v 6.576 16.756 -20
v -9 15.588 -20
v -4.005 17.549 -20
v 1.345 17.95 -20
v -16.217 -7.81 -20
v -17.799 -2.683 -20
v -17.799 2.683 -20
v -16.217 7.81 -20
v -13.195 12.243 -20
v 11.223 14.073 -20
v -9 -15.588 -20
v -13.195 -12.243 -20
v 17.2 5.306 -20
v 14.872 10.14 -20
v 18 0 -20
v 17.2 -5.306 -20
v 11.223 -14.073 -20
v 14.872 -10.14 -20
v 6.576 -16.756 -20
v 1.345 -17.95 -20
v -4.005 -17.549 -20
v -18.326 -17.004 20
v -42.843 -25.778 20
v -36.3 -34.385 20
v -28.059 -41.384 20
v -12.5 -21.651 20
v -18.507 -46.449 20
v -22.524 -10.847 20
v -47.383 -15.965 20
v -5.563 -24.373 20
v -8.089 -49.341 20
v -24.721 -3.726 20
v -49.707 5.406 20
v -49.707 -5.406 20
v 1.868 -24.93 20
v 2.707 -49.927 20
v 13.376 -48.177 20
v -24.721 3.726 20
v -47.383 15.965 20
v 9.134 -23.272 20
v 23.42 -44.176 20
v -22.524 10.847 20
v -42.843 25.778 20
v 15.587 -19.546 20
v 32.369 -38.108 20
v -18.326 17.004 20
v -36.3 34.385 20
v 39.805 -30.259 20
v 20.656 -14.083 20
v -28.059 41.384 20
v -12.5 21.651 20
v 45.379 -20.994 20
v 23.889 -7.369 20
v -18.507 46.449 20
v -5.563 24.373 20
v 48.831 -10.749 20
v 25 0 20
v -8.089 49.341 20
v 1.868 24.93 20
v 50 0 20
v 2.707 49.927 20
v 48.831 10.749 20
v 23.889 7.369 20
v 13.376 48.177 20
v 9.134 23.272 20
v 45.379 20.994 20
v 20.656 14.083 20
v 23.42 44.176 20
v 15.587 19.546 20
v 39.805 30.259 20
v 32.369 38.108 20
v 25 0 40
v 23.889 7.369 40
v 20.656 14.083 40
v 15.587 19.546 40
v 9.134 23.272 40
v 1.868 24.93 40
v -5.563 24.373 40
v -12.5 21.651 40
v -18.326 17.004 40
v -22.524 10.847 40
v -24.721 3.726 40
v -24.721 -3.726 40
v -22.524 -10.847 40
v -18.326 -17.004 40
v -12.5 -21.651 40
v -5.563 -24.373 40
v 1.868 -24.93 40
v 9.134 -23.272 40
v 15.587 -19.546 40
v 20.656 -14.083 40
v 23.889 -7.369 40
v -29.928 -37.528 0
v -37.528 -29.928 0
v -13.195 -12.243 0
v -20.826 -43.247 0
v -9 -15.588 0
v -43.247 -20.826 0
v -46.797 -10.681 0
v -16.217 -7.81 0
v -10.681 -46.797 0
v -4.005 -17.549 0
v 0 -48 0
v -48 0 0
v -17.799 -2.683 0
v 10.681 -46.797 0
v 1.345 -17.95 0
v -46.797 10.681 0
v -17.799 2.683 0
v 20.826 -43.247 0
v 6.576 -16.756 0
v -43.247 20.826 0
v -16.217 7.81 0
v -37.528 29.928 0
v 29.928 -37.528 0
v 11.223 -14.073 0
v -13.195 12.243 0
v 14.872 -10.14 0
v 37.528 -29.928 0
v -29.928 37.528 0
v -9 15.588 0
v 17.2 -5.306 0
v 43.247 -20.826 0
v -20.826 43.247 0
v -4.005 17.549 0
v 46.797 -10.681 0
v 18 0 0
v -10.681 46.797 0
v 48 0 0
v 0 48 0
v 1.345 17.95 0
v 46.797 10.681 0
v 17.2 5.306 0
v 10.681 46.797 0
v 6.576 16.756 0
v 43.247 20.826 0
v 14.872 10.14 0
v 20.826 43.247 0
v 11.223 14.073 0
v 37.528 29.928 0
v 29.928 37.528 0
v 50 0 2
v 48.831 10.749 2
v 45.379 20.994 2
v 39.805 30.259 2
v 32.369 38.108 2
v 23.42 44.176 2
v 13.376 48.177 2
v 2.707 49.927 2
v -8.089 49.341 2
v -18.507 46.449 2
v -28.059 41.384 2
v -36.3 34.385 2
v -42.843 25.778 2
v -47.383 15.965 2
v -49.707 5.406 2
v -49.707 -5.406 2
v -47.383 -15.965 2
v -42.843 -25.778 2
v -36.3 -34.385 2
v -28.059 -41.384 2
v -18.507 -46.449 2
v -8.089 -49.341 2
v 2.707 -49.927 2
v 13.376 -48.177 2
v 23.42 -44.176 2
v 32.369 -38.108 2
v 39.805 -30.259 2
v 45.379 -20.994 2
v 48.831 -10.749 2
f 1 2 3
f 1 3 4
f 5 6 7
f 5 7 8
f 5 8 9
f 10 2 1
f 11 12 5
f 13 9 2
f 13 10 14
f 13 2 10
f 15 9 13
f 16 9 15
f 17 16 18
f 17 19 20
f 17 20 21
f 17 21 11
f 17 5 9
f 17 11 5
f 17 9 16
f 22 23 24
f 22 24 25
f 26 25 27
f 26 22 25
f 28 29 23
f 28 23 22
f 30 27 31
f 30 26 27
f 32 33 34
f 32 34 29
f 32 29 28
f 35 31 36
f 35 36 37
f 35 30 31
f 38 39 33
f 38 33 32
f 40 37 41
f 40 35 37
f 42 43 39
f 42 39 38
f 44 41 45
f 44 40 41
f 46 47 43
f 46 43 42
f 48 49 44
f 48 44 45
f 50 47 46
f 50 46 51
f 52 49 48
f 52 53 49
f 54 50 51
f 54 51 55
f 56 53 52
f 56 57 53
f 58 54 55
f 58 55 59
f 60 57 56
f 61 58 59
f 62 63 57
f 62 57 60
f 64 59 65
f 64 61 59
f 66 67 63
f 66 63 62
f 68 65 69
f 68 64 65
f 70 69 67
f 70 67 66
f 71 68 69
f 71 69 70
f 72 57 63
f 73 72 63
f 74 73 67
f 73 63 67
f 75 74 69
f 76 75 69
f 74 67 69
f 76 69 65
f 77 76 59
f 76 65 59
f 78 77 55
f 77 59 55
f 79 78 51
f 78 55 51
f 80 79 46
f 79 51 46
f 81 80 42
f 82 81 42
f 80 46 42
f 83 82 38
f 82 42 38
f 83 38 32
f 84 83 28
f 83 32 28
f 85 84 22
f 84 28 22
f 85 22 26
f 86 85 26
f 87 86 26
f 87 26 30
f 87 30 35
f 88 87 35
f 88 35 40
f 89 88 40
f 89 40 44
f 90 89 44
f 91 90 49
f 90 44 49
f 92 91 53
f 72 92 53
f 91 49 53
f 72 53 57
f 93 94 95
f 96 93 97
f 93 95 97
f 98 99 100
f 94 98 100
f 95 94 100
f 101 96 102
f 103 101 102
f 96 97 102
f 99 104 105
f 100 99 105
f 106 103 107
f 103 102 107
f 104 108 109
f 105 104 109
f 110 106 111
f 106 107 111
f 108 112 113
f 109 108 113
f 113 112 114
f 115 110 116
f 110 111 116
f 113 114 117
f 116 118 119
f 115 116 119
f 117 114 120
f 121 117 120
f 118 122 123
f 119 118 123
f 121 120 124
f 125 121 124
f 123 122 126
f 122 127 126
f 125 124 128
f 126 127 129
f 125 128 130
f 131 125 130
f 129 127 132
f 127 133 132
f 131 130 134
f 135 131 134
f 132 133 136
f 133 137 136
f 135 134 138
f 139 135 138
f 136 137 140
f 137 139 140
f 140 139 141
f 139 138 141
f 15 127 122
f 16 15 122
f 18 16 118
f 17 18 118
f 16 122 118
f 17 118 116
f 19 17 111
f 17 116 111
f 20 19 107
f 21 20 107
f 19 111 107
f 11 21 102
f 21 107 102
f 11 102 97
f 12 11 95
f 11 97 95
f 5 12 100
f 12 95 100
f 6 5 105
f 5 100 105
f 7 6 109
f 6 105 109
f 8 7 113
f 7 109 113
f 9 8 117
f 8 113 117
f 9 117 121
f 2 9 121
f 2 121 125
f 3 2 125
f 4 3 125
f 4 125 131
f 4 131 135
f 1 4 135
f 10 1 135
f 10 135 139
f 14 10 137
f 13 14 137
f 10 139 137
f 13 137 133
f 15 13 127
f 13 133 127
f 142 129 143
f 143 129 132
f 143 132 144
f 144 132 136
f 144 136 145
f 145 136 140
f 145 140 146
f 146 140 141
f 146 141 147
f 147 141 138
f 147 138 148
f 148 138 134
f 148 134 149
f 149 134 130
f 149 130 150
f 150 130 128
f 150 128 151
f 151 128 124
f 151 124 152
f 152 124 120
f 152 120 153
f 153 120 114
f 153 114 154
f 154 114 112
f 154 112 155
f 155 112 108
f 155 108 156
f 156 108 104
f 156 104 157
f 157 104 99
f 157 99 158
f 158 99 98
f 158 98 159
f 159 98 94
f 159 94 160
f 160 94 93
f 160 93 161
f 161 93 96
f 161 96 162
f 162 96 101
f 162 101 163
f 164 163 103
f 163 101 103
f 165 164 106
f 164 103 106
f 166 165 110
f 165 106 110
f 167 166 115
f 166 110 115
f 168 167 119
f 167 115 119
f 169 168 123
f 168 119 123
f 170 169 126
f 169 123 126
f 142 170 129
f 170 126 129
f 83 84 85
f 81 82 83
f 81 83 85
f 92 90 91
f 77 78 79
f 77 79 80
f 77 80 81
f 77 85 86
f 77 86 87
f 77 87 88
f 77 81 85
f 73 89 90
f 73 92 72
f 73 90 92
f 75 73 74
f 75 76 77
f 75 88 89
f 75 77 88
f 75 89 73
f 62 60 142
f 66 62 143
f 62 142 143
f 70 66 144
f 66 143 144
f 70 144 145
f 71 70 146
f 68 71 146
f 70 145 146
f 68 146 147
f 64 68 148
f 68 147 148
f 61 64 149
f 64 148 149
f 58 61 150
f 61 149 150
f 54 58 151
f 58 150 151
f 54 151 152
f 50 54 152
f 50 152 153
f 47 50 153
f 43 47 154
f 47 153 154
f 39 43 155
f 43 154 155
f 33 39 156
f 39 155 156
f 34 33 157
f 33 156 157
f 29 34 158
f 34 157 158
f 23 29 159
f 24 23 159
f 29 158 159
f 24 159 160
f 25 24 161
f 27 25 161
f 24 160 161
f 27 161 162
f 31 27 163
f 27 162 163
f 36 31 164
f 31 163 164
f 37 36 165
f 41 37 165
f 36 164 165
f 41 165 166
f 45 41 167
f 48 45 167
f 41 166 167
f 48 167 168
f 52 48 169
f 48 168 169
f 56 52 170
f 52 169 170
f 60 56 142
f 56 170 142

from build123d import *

# Parameters (mm, degrees)
SKETCH_R     = 50
PAD_DEPTH    = 20
CHAMFER_SIZE = 2
SKETCH001_R  = 18
PAD001_DEPTH = 20
SKETCH002_R  = 25
PAD002_DEPTH = 20


with BuildPart() as part:
    # Sketch → Pad (new body)
    with BuildSketch(Plane.XY):
        Circle(SKETCH_R)
    extrude(amount=PAD_DEPTH)

    # Chamfer
    chamfer_edges = [part.edges().sort_by_distance(p)[0] for p in [
        (-50, 0, 0),
    ]]
    chamfer(chamfer_edges, length=CHAMFER_SIZE)

    # Sketch001 (on Face4 of Chamfer) → Pad001 (join)
    with BuildSketch(Plane(origin=(0, 0, 0), x_dir=(1, 0, 0), z_dir=(0, 0, -1))):
        Circle(SKETCH001_R)
    extrude(amount=PAD001_DEPTH)

    # Sketch002 (on Face3 of Pad001) → Pad002 (join)
    with BuildSketch(Plane.XY.offset(20)):
        Circle(SKETCH002_R)
    extrude(amount=PAD002_DEPTH)


solid = part.part
